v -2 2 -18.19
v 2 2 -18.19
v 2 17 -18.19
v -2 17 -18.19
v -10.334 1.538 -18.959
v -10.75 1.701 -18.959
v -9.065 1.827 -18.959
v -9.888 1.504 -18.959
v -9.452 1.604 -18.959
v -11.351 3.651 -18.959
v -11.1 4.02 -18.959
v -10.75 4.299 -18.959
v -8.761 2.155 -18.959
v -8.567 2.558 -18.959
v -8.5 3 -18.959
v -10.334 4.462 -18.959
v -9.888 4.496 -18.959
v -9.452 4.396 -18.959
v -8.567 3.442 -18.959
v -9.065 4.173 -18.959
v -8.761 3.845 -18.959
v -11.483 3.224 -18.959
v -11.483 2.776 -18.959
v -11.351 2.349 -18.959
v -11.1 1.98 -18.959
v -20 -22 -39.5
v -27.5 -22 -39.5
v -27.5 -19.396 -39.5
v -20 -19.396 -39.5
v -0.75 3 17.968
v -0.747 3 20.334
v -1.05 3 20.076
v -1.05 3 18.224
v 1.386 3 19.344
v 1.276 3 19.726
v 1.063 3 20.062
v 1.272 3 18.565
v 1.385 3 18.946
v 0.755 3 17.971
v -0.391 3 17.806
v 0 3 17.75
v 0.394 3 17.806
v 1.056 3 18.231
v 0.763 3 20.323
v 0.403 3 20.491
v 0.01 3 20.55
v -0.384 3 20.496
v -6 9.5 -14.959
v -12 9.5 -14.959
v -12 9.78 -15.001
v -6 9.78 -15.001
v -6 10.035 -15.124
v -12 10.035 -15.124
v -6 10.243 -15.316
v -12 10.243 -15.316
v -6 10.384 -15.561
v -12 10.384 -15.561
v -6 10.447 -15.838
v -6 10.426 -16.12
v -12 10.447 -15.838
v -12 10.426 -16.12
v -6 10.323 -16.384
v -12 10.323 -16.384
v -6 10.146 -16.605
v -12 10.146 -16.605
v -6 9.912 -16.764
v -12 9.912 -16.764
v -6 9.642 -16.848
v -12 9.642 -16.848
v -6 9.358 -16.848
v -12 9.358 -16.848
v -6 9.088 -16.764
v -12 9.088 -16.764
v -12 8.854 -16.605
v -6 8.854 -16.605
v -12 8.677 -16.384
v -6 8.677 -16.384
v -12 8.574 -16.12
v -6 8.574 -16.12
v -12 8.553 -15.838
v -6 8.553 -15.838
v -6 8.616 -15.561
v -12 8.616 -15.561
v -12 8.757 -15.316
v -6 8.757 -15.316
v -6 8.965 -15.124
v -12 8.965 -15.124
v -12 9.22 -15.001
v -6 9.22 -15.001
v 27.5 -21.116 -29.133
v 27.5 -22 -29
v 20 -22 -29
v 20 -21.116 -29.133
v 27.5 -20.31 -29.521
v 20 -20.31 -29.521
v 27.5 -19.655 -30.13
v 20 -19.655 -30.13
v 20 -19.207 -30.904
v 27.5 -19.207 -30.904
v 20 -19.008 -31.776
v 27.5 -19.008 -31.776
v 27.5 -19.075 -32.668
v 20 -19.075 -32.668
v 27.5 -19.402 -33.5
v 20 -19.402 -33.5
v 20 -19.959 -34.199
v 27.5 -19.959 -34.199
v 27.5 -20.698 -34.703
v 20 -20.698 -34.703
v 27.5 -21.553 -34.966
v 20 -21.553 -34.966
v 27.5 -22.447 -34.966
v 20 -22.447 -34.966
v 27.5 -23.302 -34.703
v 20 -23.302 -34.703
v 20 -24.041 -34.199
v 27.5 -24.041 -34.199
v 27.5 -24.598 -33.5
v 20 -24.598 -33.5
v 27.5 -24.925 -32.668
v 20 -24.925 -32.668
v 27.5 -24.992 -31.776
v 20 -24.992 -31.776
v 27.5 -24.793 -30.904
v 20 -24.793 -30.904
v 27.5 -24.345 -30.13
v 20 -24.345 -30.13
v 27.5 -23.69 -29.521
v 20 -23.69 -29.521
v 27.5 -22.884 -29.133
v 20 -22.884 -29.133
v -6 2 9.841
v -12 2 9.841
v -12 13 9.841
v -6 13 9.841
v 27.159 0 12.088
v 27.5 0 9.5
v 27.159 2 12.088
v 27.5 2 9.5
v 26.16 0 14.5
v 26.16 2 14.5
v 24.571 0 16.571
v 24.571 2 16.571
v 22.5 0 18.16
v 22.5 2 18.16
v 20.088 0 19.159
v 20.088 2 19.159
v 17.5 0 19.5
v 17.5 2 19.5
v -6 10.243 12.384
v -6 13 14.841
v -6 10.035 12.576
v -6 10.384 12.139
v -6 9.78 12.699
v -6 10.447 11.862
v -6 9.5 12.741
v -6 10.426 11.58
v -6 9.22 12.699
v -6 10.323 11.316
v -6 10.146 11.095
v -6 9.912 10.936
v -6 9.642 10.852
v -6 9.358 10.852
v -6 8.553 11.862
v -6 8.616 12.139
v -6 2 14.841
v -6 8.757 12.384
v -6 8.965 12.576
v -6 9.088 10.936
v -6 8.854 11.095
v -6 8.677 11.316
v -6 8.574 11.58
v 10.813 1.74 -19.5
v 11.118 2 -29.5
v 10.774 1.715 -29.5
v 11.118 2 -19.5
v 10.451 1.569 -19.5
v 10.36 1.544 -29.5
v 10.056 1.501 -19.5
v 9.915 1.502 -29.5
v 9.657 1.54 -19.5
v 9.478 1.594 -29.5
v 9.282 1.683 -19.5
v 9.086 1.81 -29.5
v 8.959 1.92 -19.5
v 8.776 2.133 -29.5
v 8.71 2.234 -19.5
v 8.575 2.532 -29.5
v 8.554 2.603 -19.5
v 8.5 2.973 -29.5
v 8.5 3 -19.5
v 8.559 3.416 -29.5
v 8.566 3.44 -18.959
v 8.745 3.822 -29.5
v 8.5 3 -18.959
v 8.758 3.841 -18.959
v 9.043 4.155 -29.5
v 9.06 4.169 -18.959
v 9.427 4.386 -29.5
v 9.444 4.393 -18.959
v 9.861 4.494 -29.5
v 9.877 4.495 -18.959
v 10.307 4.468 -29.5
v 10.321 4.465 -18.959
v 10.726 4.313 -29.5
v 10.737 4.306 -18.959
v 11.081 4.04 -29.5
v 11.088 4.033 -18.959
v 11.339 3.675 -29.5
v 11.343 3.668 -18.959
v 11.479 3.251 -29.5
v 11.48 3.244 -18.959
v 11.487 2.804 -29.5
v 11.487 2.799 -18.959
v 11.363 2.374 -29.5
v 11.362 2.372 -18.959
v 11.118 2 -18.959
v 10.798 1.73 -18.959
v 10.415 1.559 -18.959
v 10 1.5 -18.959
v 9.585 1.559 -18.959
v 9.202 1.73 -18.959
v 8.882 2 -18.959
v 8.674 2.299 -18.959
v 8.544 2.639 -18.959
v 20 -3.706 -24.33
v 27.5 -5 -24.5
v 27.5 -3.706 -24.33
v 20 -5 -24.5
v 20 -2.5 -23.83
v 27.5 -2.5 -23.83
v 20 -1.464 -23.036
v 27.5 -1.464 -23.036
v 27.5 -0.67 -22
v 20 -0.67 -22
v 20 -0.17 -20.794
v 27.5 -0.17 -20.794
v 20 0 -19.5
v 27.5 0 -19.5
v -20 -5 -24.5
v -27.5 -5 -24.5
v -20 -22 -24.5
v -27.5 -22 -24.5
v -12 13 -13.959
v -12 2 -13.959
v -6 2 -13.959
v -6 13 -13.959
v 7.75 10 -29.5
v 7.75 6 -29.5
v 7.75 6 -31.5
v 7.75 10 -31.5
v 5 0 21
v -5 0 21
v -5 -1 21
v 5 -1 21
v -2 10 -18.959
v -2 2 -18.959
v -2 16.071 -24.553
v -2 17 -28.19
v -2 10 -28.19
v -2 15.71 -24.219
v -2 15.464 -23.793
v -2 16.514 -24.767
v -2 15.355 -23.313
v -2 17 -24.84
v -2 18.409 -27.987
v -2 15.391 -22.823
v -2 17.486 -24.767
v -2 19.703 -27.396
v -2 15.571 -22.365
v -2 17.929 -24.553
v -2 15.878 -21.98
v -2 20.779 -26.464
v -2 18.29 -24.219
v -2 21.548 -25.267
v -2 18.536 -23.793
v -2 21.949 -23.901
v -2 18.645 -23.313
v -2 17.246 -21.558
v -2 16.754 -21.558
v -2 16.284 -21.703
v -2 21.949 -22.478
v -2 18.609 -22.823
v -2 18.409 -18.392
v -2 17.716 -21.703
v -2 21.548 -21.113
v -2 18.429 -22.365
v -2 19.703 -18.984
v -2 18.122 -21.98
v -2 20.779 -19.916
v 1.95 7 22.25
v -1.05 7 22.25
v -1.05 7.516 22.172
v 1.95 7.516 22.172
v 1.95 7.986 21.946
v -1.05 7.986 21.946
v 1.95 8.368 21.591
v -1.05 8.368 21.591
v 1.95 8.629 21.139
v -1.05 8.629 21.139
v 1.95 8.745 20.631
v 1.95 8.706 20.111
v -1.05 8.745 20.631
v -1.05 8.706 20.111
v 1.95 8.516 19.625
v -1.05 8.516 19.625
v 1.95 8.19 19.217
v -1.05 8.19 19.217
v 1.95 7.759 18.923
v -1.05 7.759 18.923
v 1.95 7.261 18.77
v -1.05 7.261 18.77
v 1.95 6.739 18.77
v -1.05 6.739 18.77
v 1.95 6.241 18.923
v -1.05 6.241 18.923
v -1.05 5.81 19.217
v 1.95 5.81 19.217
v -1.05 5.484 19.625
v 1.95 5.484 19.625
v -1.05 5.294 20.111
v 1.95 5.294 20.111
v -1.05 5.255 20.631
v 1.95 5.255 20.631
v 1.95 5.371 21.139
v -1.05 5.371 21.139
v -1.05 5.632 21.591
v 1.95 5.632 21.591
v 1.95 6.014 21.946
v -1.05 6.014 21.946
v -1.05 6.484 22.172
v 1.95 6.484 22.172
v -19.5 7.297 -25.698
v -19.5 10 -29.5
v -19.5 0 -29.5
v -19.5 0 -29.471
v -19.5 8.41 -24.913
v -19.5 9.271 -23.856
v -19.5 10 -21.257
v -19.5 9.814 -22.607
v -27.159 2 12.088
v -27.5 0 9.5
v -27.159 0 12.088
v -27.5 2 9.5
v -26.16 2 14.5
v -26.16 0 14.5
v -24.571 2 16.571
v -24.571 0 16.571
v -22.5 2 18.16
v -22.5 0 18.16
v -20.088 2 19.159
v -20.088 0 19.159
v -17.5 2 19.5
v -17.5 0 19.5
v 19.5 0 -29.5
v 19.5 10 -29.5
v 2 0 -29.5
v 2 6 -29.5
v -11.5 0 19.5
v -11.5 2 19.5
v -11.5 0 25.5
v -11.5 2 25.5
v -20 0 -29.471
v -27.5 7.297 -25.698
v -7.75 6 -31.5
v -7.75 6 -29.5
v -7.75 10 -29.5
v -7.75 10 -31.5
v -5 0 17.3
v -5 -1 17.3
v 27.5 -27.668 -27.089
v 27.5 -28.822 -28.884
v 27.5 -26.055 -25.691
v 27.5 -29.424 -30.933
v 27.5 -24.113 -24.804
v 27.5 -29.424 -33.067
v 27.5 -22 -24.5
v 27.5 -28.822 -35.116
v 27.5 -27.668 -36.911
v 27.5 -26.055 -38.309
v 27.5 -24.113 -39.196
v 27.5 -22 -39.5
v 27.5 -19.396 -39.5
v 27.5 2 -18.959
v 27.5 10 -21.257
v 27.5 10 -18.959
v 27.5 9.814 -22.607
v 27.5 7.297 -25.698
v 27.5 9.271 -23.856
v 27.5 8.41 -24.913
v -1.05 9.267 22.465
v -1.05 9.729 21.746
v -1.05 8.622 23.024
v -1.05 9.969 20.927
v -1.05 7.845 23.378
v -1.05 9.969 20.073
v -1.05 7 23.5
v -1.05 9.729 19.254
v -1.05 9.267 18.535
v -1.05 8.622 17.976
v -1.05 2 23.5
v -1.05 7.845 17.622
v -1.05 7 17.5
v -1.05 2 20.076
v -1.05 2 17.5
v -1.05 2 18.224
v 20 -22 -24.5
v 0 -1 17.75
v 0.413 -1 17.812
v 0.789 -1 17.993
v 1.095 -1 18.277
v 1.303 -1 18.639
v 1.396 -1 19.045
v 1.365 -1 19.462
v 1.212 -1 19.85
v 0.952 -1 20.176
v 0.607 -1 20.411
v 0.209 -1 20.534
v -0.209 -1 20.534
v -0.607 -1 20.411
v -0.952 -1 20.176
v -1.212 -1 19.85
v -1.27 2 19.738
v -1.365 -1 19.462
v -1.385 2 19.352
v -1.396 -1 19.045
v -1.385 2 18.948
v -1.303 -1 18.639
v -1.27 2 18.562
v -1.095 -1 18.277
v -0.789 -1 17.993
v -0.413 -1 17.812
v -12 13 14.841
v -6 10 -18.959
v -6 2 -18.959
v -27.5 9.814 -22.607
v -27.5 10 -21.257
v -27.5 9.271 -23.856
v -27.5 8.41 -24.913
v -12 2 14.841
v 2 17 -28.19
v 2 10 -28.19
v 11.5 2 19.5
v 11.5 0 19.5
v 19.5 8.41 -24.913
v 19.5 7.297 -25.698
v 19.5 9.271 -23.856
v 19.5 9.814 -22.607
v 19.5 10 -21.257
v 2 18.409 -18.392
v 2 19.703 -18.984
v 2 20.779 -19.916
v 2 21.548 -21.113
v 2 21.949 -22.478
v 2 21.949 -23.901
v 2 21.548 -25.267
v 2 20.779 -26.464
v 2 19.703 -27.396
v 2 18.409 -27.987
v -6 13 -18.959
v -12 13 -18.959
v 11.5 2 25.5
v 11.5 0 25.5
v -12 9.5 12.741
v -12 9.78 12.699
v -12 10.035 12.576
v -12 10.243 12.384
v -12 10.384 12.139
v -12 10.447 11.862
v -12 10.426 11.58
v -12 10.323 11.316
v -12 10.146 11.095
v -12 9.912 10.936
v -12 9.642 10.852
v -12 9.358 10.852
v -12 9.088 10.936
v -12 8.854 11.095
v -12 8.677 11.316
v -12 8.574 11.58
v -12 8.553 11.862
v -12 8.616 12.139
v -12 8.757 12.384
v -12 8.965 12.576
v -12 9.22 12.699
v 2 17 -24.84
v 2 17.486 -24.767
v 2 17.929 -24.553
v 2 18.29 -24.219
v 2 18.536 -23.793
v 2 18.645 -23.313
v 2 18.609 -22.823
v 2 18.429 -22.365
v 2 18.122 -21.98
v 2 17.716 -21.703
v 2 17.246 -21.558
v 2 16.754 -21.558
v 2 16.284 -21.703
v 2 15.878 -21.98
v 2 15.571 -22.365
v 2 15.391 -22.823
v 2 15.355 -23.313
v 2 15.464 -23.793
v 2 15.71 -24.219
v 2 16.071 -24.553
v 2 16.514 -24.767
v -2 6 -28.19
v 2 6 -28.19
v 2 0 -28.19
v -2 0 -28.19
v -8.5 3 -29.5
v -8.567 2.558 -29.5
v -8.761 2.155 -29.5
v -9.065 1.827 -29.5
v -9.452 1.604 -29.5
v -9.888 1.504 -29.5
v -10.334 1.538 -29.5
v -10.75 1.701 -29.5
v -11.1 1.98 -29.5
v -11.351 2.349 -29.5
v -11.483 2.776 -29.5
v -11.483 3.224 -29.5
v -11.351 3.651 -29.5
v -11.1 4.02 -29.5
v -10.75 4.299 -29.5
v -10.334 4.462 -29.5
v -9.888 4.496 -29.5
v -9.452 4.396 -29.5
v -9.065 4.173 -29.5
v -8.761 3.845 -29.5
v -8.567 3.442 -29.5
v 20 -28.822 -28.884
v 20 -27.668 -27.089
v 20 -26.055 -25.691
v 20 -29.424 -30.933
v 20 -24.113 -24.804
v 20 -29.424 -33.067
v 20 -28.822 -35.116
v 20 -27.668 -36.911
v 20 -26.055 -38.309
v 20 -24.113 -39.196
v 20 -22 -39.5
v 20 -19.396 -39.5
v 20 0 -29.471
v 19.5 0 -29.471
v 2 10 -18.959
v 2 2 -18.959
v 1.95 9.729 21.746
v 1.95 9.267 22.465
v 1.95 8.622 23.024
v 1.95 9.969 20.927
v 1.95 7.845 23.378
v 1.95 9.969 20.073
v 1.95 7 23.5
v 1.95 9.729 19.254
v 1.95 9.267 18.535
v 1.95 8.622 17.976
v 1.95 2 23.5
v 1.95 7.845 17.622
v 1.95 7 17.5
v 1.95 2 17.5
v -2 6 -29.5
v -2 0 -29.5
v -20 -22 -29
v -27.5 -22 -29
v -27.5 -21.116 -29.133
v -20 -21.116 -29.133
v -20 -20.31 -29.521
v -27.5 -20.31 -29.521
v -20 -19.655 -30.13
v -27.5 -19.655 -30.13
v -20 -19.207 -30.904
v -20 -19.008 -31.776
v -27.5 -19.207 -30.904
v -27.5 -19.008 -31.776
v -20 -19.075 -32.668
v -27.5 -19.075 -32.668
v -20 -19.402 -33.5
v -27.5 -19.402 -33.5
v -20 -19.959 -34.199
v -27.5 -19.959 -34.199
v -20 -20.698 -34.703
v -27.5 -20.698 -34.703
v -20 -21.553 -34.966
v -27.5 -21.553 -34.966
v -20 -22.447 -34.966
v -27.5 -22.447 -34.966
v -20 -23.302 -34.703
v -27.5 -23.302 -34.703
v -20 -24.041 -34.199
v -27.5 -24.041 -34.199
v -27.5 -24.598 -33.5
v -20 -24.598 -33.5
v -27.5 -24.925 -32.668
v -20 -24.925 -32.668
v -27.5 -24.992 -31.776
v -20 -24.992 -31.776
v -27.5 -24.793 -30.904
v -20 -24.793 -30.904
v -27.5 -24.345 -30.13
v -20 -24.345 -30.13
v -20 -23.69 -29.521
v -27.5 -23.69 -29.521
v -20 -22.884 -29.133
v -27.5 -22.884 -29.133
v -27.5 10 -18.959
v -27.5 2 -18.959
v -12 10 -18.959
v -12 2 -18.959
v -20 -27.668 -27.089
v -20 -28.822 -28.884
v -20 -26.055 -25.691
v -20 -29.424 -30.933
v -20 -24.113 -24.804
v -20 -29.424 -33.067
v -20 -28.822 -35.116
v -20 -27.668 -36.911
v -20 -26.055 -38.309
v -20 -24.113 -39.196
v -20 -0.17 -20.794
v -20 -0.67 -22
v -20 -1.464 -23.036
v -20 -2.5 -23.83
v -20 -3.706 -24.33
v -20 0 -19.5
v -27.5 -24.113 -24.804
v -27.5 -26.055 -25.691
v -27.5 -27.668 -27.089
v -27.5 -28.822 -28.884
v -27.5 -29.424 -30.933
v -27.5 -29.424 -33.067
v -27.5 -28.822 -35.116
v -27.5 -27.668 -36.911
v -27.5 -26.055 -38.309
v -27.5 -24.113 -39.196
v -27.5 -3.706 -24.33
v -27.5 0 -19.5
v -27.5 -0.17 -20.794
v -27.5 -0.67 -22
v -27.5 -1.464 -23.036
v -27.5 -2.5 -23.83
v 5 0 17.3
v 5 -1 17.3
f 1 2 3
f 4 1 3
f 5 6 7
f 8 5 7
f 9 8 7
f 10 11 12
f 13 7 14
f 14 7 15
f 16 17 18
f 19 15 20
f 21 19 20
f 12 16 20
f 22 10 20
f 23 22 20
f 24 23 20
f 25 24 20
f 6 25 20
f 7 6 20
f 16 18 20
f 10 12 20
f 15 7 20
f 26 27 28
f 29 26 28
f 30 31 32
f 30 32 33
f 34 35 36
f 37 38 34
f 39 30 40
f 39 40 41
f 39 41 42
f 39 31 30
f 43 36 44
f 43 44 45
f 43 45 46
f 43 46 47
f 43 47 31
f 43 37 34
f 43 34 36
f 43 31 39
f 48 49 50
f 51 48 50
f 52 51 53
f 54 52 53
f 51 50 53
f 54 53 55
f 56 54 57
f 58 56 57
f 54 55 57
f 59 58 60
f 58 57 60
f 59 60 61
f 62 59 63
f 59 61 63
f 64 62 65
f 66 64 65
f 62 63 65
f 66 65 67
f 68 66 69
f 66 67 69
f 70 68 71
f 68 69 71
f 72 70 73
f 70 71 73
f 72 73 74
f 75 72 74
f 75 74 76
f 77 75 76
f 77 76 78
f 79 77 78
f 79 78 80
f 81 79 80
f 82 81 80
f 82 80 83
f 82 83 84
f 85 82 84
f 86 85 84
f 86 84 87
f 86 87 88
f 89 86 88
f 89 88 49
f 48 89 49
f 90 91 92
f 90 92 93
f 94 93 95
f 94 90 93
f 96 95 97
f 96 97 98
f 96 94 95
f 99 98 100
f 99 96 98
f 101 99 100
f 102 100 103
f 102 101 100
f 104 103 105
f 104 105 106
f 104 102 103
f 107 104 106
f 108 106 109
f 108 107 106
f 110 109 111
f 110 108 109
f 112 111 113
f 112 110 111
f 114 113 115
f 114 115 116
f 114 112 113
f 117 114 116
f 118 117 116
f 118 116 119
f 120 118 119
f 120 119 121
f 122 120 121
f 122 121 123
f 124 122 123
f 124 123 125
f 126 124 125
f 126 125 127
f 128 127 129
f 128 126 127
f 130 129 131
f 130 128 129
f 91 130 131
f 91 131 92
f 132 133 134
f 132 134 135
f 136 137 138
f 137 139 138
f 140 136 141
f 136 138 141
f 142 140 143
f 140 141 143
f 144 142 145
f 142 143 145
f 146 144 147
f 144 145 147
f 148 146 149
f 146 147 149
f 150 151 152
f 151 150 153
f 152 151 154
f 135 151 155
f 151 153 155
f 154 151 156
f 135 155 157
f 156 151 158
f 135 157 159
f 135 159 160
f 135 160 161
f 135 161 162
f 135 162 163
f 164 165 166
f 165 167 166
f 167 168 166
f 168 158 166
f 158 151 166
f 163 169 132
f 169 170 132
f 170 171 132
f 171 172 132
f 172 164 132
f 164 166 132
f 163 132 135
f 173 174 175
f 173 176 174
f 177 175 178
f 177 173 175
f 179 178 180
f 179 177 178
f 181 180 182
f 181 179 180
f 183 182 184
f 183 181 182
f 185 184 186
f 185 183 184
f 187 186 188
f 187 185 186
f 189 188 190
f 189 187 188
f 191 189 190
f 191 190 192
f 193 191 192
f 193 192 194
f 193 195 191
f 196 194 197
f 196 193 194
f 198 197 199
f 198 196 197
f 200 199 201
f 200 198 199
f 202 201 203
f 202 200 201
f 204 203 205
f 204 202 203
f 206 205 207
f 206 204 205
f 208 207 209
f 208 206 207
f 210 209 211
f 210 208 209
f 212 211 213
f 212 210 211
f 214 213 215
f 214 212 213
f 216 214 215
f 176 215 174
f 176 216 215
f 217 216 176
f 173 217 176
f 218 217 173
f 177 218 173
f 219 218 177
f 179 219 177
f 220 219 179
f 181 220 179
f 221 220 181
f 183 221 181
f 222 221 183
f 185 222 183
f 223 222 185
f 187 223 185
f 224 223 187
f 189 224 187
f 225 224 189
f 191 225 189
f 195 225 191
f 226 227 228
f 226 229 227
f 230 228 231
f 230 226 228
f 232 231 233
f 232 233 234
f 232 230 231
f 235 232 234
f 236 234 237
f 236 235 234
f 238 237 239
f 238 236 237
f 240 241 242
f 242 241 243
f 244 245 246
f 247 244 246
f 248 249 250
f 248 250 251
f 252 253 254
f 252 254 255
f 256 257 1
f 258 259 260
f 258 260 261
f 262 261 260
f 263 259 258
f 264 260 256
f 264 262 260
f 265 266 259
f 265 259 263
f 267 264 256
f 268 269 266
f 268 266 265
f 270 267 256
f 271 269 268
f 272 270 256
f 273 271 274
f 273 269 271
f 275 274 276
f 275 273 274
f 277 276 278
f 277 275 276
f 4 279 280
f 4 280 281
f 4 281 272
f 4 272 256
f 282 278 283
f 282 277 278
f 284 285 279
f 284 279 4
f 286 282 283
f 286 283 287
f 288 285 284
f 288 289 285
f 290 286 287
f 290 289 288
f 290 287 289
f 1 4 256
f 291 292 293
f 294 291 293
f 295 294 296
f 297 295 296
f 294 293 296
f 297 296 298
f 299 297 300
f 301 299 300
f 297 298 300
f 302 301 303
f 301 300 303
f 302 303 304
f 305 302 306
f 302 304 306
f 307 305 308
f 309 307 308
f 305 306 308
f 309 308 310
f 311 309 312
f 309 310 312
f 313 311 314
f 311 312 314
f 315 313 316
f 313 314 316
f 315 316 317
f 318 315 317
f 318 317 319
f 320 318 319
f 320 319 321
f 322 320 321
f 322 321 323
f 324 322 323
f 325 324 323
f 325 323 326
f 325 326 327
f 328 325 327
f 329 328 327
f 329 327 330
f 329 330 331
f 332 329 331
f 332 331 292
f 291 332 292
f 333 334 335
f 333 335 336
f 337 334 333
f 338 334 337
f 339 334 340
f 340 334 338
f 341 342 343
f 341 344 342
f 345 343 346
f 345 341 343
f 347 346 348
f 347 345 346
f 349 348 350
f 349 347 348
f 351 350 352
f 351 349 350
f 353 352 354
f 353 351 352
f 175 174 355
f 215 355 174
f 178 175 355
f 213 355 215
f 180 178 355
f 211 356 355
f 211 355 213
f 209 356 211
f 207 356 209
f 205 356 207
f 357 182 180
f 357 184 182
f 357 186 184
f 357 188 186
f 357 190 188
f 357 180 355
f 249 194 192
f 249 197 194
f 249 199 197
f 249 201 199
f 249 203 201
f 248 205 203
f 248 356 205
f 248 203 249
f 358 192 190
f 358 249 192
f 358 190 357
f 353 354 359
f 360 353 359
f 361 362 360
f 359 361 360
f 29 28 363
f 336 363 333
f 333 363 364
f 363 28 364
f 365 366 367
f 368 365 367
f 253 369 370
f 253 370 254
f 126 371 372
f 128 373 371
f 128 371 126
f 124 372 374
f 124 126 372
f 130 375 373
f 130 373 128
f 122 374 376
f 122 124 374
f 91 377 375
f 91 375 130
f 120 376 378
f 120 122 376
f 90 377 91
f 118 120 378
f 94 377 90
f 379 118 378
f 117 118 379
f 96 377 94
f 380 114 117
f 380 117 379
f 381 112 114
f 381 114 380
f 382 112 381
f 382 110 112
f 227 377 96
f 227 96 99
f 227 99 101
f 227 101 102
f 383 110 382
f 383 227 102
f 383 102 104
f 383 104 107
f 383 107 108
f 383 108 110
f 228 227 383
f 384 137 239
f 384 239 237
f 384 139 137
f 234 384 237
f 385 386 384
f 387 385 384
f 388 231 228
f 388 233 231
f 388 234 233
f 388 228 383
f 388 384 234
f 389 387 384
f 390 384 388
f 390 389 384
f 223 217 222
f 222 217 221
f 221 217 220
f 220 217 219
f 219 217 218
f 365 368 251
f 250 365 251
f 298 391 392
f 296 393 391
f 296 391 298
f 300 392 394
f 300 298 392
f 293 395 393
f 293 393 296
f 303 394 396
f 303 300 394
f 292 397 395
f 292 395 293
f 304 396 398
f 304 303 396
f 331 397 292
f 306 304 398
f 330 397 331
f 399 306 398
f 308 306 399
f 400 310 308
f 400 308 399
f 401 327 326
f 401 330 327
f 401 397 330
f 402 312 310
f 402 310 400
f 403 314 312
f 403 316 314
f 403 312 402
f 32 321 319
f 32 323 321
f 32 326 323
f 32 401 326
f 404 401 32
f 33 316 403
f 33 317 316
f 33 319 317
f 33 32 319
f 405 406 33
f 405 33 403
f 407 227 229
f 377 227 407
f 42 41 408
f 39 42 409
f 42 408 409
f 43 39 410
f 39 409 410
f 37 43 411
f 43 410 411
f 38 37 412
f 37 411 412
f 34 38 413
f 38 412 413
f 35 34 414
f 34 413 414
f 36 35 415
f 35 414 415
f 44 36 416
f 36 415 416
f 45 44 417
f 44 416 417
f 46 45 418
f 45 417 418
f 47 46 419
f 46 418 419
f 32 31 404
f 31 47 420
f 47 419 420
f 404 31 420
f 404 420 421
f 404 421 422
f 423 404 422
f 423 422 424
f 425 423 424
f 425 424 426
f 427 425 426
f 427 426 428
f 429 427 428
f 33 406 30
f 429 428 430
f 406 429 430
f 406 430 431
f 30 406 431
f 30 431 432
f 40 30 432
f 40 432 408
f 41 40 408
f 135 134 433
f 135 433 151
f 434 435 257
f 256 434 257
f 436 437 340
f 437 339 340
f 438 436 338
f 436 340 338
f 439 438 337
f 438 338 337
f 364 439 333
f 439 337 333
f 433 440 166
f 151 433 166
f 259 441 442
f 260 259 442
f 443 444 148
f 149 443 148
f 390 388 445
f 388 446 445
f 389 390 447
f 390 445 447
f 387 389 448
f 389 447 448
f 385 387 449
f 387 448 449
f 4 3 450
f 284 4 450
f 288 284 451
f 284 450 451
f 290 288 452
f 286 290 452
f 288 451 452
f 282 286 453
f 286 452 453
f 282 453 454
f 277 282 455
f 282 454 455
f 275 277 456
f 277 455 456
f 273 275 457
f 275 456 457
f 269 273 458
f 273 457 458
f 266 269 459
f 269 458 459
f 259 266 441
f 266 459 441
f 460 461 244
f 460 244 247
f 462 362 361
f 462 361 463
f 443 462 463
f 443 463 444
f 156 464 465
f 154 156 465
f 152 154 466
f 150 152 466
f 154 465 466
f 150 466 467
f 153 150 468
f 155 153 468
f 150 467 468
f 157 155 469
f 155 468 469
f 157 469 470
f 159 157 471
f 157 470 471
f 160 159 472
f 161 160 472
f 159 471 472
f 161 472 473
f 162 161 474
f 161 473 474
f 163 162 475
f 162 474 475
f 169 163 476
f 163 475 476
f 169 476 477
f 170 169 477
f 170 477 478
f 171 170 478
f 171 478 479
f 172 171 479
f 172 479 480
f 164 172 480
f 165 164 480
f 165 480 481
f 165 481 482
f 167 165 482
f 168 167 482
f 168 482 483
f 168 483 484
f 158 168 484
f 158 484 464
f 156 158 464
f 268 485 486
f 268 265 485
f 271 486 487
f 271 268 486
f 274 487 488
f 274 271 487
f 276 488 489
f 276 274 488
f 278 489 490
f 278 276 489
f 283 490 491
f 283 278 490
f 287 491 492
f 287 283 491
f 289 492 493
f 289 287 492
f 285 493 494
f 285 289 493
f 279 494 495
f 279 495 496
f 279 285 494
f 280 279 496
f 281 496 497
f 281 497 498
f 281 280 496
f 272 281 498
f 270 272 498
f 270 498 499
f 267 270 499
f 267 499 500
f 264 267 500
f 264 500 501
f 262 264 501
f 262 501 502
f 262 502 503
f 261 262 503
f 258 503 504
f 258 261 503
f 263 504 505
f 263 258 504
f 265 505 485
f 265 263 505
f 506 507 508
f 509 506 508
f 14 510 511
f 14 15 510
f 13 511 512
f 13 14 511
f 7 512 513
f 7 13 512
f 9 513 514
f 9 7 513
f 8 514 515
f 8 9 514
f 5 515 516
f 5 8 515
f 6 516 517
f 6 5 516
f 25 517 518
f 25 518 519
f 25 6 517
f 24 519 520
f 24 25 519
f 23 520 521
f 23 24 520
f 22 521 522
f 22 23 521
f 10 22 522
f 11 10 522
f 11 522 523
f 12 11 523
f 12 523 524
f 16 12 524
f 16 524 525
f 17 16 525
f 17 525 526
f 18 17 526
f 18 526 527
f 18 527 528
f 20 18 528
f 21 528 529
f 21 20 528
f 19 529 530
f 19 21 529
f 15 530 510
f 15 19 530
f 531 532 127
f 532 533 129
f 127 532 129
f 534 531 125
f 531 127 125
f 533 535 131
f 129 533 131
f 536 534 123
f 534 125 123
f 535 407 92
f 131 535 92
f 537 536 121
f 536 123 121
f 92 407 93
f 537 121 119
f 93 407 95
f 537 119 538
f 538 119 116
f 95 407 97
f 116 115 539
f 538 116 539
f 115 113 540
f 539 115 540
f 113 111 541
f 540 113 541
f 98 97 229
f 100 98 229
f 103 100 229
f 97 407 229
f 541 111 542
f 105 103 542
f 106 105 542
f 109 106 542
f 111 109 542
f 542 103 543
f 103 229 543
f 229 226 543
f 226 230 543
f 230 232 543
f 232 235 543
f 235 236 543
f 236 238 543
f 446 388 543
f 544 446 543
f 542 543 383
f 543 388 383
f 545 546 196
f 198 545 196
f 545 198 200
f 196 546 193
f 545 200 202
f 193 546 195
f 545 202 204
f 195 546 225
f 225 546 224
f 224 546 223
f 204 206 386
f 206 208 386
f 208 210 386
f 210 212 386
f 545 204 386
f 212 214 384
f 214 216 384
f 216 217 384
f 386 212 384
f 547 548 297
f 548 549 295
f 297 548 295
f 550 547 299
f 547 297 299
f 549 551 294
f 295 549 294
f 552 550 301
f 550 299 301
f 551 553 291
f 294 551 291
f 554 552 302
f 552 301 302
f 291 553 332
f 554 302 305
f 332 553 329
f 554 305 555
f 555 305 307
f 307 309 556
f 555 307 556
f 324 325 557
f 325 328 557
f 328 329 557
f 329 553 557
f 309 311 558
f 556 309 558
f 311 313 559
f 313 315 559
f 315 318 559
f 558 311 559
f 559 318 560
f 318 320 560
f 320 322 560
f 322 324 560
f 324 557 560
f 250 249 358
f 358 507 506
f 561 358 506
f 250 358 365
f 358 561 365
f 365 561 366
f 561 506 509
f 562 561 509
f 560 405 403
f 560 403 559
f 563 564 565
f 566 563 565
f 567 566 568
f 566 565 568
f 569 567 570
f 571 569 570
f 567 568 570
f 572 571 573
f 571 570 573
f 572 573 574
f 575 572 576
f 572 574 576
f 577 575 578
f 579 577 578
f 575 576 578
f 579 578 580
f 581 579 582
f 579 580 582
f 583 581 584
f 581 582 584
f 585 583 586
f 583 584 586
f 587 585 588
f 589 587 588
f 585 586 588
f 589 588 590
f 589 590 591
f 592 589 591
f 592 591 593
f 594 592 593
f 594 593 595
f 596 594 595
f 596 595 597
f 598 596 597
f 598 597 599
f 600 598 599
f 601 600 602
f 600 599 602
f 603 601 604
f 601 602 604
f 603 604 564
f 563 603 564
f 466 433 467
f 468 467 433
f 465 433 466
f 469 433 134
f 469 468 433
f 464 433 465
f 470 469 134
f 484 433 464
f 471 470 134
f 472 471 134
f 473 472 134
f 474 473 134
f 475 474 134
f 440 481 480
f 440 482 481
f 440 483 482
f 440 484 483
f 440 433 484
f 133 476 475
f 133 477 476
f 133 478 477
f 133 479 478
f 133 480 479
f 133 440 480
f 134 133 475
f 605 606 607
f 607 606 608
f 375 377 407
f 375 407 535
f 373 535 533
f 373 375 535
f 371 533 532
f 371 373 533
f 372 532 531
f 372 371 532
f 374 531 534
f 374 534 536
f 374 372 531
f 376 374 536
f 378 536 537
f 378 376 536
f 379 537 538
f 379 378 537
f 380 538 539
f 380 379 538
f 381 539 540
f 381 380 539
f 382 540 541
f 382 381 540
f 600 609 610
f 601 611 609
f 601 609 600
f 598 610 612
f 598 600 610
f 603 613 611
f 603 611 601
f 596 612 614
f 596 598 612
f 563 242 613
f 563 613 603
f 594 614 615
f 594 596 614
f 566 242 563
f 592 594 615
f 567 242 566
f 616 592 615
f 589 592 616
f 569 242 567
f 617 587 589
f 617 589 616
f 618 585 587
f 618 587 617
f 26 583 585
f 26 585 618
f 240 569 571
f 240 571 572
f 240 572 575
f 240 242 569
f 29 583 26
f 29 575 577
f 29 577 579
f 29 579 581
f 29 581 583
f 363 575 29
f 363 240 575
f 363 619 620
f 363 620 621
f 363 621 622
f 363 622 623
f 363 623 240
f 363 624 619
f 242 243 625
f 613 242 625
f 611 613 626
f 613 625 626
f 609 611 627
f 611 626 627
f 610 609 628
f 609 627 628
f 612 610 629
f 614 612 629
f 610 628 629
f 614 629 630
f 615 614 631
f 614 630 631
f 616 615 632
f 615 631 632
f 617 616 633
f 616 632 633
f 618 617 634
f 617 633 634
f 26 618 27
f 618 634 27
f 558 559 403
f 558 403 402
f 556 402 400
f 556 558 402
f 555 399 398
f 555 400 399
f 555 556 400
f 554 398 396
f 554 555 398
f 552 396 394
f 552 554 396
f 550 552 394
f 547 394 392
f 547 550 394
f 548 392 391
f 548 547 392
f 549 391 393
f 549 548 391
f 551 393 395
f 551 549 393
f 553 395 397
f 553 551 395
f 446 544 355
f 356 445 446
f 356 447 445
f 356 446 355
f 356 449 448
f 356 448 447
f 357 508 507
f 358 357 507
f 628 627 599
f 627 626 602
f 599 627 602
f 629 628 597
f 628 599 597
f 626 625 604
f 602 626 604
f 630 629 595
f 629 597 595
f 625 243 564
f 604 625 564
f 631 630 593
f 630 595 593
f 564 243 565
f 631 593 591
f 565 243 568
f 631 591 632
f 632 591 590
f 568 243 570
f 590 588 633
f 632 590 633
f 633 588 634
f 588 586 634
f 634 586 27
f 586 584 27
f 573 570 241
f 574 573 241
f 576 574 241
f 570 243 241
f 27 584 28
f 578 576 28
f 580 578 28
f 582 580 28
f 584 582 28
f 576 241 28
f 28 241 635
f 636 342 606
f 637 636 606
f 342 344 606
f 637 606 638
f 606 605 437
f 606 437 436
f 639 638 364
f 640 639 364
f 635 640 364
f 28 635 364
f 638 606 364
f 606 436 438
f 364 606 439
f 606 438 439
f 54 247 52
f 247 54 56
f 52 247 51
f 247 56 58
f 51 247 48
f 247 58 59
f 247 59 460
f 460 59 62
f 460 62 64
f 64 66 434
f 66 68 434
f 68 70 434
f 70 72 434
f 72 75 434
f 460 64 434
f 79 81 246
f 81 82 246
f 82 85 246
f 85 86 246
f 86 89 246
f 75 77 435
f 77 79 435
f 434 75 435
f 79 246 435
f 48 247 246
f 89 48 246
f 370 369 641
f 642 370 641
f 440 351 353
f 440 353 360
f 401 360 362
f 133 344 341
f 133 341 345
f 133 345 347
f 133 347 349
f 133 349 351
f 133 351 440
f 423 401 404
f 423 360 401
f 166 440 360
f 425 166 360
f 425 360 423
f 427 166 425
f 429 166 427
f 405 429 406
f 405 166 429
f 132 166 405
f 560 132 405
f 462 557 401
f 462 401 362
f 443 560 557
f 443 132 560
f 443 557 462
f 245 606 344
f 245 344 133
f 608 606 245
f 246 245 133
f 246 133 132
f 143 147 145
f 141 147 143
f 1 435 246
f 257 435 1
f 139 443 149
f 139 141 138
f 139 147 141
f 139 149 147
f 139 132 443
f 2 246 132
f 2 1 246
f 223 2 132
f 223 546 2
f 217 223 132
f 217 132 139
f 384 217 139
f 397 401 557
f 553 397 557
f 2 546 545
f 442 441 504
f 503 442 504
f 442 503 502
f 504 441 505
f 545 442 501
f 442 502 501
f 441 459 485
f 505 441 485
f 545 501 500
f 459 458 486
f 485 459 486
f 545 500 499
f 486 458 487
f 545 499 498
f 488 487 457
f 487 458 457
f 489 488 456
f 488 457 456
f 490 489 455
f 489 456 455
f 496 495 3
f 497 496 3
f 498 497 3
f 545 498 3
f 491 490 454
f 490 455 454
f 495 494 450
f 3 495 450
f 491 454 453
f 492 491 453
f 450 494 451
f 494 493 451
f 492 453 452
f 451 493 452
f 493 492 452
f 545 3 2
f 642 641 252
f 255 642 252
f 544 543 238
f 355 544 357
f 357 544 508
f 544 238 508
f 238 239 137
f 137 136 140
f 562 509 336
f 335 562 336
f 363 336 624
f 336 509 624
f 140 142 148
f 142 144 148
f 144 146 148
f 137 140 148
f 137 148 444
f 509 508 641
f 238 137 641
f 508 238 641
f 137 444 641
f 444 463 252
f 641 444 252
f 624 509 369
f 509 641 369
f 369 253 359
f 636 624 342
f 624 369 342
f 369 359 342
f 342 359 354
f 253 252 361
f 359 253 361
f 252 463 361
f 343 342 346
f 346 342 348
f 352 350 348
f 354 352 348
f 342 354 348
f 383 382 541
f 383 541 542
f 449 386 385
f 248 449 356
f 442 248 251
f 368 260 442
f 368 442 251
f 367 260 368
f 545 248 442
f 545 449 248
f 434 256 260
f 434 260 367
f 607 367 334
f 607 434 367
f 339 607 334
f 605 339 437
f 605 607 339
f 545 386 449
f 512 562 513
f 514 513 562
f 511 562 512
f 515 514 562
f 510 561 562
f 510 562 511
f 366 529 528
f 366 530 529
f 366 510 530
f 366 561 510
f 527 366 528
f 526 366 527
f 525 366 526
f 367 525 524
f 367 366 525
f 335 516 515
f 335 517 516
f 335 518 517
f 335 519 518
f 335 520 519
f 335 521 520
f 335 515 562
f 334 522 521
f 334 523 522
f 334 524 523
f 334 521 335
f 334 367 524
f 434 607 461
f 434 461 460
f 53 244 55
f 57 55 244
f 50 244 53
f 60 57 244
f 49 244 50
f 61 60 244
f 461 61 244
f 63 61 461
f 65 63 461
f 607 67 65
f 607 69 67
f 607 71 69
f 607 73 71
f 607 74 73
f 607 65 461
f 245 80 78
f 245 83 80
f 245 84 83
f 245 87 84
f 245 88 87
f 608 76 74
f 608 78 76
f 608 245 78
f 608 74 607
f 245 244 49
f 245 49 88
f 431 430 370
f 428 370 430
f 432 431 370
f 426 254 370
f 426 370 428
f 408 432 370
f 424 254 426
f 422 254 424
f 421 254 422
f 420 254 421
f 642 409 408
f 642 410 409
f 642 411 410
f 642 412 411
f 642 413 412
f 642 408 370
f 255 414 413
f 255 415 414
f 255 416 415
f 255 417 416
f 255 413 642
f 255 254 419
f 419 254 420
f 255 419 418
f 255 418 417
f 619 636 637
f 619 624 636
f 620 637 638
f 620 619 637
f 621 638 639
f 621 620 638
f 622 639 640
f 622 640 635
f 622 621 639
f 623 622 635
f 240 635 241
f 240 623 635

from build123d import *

# Parameters (mm, degrees)
SKETCH_1_W          = 55
SKETCH_1_H          = 39
EXTRUDE_1_DEPTH     = 2
SKETCH_2_W          = 23
SKETCH_2_H          = 6
EXTRUDE_2_DEPTH     = 2
SKETCH_3_W          = 6
SKETCH_3_H          = 5
EXTRUDE_3_DEPTH     = 11
SKETCH_5_R          = 0.95
CUT_EXTRUDE_1_DEPTH = 11
SKETCH_6_W          = 55
SKETCH_6_H          = 0.541458129
EXTRUDE_4_DEPTH     = 8
SKETCH_8_R          = 1.65
EXTRUDE_6_DEPTH     = 2
SKETCH_10_W         = 3
SKETCH_10_H         = 6
EXTRUDE_7_DEPTH     = 8
SKETCH_11_R         = 1.5
CUT_EXTRUDE_3_DEPTH = 13
SKETCH_12_R         = 3
EXTRUDE_8_DEPTH     = 7.5
SKETCH_13_W         = 10
SKETCH_13_H         = 3.7
EXTRUDE_9_DEPTH     = 1
FILLET_3_RADIUS     = 3
FILLET_3_LENGTH     = 3
SKETCH_15_R         = 1.75
CUT_EXTRUDE_5_DEPTH = 23
SKETCH_16_W         = 15.5
SKETCH_16_H         = 4
EXTRUDE_10_DEPTH    = 20
SKETCH_17_R         = 1.5
EXTRUDE_11_DEPTH    = 10
FILLET_4_R          = 10
SKETCH_18_W         = 26.564734734
SKETCH_18_H         = 10.454508508
CUT_EXTRUDE_6_DEPTH = 10
CUT_EXTRUDE_7_DEPTH = 8
CUT_EXTRUDE_8_DEPTH = 8
FILLET_6_R          = 5
SKETCH_21_R         = 1.4
CUT_EXTRUDE_9_DEPTH = 4
FILLET_7_R          = 10


with BuildPart() as part:
    # 草图1 → 凸台-拉伸1 (new body)
    with BuildSketch(Plane(origin=(0, 0, 0), x_dir=(1, 0, 0), z_dir=(0, 1, 0))):
        Rectangle(SKETCH_1_W, SKETCH_1_H)
    extrude(amount=EXTRUDE_1_DEPTH)

    # 草图2 → 凸台-拉伸2 (add)
    with BuildSketch(Plane(origin=(0, 2, 0), x_dir=(1, 0, 0), z_dir=(0, 1, 0))):
        with Locations((0, -22.5)):
            Rectangle(SKETCH_2_W, SKETCH_2_H)
    extrude(amount=-EXTRUDE_2_DEPTH)

    # 草图3 → 凸台-拉伸3 (add)
    with BuildSketch(Plane(origin=(0, 2, 0), x_dir=(1, 0, 0), z_dir=(0, 1, 0))):
        with Locations((-9, -12.341458129)):
            Rectangle(SKETCH_3_W, SKETCH_3_H)
        with Locations((-9, 16.458541871)):
            Rectangle(SKETCH_3_W, SKETCH_3_H)
    extrude(amount=EXTRUDE_3_DEPTH)

    # 草图5 → 切除-拉伸1 (cut)
    with BuildSketch(Plane.ZY.offset(12)):
        with Locations((-15.908541871, 9.5)):
            Circle(SKETCH_5_R)
        with Locations((11.791458129, 9.5)):
            Circle(SKETCH_5_R)
    extrude(amount=-CUT_EXTRUDE_1_DEPTH, mode=Mode.SUBTRACT)

    # 草图6 → 凸台-拉伸4 (add)
    with BuildSketch(Plane(origin=(0, 2, 0), x_dir=(1, 0, 0), z_dir=(0, 1, 0))):
        with Locations((0, 19.229270936)):
            Rectangle(SKETCH_6_W, SKETCH_6_H)
    extrude(amount=EXTRUDE_4_DEPTH)

    # 草图8 → 凸台-拉伸6 (add, symmetric)
    with BuildSketch(Plane(origin=(0, 0, 0), x_dir=(0, 0, -1), z_dir=(1, 0, 0))):
        with BuildLine():
            Line((28.189872998, 17), (28.189872998, 0))
            Line((28.189872998, 0), (18.189872998, 0))
            Line((18.189872998, 0), (18.189872998, 17))
            ThreePointArc((18.189872998, 17), (23.189872998, 22), (28.189872998, 17))
        make_face()
        with Locations((23.189872998, 17)):
            Circle(SKETCH_8_R, mode=Mode.SUBTRACT)
    extrude(amount=EXTRUDE_6_DEPTH, both=True)

    # 草图10 → 凸台-拉伸7 (add)
    with BuildSketch(Plane(origin=(0, 2, 0), x_dir=(1, 0, 0), z_dir=(0, 1, 0))):
        with Locations((0.45, -20.5)):
            Rectangle(SKETCH_10_W, SKETCH_10_H)
    extrude(amount=EXTRUDE_7_DEPTH)

    # 草图11 → 切除-拉伸3 (cut)
    with BuildSketch(Plane.XY.offset(-18.958541871)):
        with Locations((-10, 3)):
            Circle(SKETCH_11_R)
    cut_extrude_3 = extrude(amount=-CUT_EXTRUDE_3_DEPTH, mode=Mode.SUBTRACT)

    # 草图12 → 凸台-拉伸8 (add)
    with BuildSketch(Plane.ZY.offset(27.5)):
        with BuildLine():
            Line((-39.5, -22), (-39.5, 10))
            Line((-39.5, 10), (-19.5, 10))
            Line((-19.5, 10), (-19.5, 0))
            Line((-19.5, 0), (-24.5, 0))
            Line((-24.5, 0), (-24.5, -22))
            ThreePointArc((-24.5, -22), (-32, -29.5), (-39.5, -22))
        make_face()
        with Locations((-32, -22)):
            Circle(SKETCH_12_R, mode=Mode.SUBTRACT)
    extrude_8 = extrude(amount=-EXTRUDE_8_DEPTH)

    # 草图13 → 凸台-拉伸9 (add)
    with BuildSketch(Plane.XZ):
        with Locations((0, 19.15)):
            Rectangle(SKETCH_13_W, SKETCH_13_H)
    extrude(amount=EXTRUDE_9_DEPTH)

    # 镜向1: 切除-拉伸3, 凸台-拉伸8 across plane
    add(cut_extrude_3.mirror(Plane(origin=(0, 0, 0), x_dir=(0, 0, 1), z_dir=(1, 0, 0))), mode=Mode.SUBTRACT)
    add(extrude_8.mirror(Plane(origin=(0, 0, 0), x_dir=(0, 0, 1), z_dir=(1, 0, 0))))

    # 圆角3: full round fillet: the end face becomes a half cylinder, R = half its width
    fillet_3_face = Plane((0.45, 10, 20.5), x_dir=(1, 0, 0), z_dir=(0, 1, 0))  # on the end face: x along it, z out of the body
    fillet_3_slab = fillet_3_face.offset(-FILLET_3_RADIUS / 2) * Box(FILLET_3_LENGTH, 2 * FILLET_3_RADIUS, FILLET_3_RADIUS, mode=Mode.PRIVATE)  # the body's end, R deep
    fillet_3_round = Plane((0.45, 7, 20.5), x_dir=(0, 1, 0), z_dir=(1, 0, 0)) * Cylinder(FILLET_3_RADIUS, FILLET_3_LENGTH, mode=Mode.PRIVATE)  # its axis R under the face
    add(fillet_3_slab - fillet_3_round, mode=Mode.SUBTRACT)

    # 草图15 → 切除-拉伸5 (cut)
    with BuildSketch(Plane.ZY.offset(1.05)):
        with Locations((20.5, 7)):
            Circle(SKETCH_15_R)
    extrude(amount=-CUT_EXTRUDE_5_DEPTH, mode=Mode.SUBTRACT)

    # 草图16 → 凸台-拉伸10 (add)
    with BuildSketch(Plane(origin=(0, 0, -19.5), x_dir=(-1, 0, 0), z_dir=(0, 0, -1))):
        with Locations((0, 8)):
            Rectangle(SKETCH_16_W, SKETCH_16_H)
    extrude(amount=EXTRUDE_10_DEPTH)

    # 草图17 → 凸台-拉伸11 (add)
    # profile 1 of 2: a face of its own
    with BuildSketch(Plane(origin=(0, 0, -19.5), x_dir=(-1, 0, 0), z_dir=(0, 0, -1))):
        Polygon((-20, 0), (-2, 0), (-2, 6), (-7.75, 6), (-7.75, 10), (-20, 10), align=None)
        with Locations(Location((-10, 3, 0), (0, 0, 221.810314896))):
            Circle(SKETCH_17_R, mode=Mode.SUBTRACT)
    # profile 2 of 2: a face of its own
    with BuildSketch(Plane(origin=(0, 0, -19.5), x_dir=(-1, 0, 0), z_dir=(0, 0, -1))):
        Polygon((7.75, 6), (2, 6), (2, 0), (20, 0), (20, 10), (7.75, 10), align=None)
        with Locations(Location((10, 3, 0), (0, 0, 180))):
            Circle(SKETCH_17_R, mode=Mode.SUBTRACT)
    extrude(amount=EXTRUDE_11_DEPTH)

    # 圆角4
    fillet_4_edges = [part.edges().sort_by_distance(p)[0] for p in [
        (23.75, 10, -39.5),
        (-23.75, 10, -39.5),
    ]]
    fillet(fillet_4_edges, radius=FILLET_4_R)

    # 草图18 → 切除-拉伸6 (cut)
    with BuildSketch(Plane(origin=(0, 10, 0), x_dir=(1, 0, 0), z_dir=(0, 1, 0))):
        with Locations((-0.840887807, 36.727254254)):
            Rectangle(SKETCH_18_W, SKETCH_18_H)
    extrude(amount=-CUT_EXTRUDE_6_DEPTH, mode=Mode.SUBTRACT)

    # 草图19 → 切除-拉伸7 (cut)
    with BuildSketch(Plane(origin=(27.5, 0, 0), x_dir=(0, 0, -1), z_dir=(1, 0, 0))):
        Polygon((24.3, 10), (39.5, -19.395601839), (39.5, 10), align=None)
    extrude(amount=-CUT_EXTRUDE_7_DEPTH, mode=Mode.SUBTRACT)

    # 草图20 → 切除-拉伸8 (cut)
    with BuildSketch(Plane.ZY.offset(27.5)):
        Polygon((-24.3, 10), (-39.5, 10), (-39.5, -19.395601839), align=None)
    extrude(amount=-CUT_EXTRUDE_8_DEPTH, mode=Mode.SUBTRACT)

    # 圆角6
    fillet_6_edges = [part.edges().sort_by_distance(p)[0] for p in [
        (-23.75, 0, -24.5),
        (23.75, 0, -24.5),
        (23.5, 10, -24.3),
        (-23.5, 10, -24.3),
    ]]
    fillet(fillet_6_edges, radius=FILLET_6_R)

    # 草图21 → 切除-拉伸9 (cut)
    with BuildSketch(Plane.XZ.offset(1)):
        with Locations(Location((0, 19.15, 0), (0, 0, 270))):
            Circle(SKETCH_21_R)
    extrude(amount=-CUT_EXTRUDE_9_DEPTH, mode=Mode.SUBTRACT)

    # 圆角7
    fillet_7_edges = [part.edges().sort_by_distance(p)[0] for p in [
        (27.5, 1, 19.5),
        (-27.5, 1, 19.5),
    ]]
    fillet(fillet_7_edges, radius=FILLET_7_R)


solid = part.part
